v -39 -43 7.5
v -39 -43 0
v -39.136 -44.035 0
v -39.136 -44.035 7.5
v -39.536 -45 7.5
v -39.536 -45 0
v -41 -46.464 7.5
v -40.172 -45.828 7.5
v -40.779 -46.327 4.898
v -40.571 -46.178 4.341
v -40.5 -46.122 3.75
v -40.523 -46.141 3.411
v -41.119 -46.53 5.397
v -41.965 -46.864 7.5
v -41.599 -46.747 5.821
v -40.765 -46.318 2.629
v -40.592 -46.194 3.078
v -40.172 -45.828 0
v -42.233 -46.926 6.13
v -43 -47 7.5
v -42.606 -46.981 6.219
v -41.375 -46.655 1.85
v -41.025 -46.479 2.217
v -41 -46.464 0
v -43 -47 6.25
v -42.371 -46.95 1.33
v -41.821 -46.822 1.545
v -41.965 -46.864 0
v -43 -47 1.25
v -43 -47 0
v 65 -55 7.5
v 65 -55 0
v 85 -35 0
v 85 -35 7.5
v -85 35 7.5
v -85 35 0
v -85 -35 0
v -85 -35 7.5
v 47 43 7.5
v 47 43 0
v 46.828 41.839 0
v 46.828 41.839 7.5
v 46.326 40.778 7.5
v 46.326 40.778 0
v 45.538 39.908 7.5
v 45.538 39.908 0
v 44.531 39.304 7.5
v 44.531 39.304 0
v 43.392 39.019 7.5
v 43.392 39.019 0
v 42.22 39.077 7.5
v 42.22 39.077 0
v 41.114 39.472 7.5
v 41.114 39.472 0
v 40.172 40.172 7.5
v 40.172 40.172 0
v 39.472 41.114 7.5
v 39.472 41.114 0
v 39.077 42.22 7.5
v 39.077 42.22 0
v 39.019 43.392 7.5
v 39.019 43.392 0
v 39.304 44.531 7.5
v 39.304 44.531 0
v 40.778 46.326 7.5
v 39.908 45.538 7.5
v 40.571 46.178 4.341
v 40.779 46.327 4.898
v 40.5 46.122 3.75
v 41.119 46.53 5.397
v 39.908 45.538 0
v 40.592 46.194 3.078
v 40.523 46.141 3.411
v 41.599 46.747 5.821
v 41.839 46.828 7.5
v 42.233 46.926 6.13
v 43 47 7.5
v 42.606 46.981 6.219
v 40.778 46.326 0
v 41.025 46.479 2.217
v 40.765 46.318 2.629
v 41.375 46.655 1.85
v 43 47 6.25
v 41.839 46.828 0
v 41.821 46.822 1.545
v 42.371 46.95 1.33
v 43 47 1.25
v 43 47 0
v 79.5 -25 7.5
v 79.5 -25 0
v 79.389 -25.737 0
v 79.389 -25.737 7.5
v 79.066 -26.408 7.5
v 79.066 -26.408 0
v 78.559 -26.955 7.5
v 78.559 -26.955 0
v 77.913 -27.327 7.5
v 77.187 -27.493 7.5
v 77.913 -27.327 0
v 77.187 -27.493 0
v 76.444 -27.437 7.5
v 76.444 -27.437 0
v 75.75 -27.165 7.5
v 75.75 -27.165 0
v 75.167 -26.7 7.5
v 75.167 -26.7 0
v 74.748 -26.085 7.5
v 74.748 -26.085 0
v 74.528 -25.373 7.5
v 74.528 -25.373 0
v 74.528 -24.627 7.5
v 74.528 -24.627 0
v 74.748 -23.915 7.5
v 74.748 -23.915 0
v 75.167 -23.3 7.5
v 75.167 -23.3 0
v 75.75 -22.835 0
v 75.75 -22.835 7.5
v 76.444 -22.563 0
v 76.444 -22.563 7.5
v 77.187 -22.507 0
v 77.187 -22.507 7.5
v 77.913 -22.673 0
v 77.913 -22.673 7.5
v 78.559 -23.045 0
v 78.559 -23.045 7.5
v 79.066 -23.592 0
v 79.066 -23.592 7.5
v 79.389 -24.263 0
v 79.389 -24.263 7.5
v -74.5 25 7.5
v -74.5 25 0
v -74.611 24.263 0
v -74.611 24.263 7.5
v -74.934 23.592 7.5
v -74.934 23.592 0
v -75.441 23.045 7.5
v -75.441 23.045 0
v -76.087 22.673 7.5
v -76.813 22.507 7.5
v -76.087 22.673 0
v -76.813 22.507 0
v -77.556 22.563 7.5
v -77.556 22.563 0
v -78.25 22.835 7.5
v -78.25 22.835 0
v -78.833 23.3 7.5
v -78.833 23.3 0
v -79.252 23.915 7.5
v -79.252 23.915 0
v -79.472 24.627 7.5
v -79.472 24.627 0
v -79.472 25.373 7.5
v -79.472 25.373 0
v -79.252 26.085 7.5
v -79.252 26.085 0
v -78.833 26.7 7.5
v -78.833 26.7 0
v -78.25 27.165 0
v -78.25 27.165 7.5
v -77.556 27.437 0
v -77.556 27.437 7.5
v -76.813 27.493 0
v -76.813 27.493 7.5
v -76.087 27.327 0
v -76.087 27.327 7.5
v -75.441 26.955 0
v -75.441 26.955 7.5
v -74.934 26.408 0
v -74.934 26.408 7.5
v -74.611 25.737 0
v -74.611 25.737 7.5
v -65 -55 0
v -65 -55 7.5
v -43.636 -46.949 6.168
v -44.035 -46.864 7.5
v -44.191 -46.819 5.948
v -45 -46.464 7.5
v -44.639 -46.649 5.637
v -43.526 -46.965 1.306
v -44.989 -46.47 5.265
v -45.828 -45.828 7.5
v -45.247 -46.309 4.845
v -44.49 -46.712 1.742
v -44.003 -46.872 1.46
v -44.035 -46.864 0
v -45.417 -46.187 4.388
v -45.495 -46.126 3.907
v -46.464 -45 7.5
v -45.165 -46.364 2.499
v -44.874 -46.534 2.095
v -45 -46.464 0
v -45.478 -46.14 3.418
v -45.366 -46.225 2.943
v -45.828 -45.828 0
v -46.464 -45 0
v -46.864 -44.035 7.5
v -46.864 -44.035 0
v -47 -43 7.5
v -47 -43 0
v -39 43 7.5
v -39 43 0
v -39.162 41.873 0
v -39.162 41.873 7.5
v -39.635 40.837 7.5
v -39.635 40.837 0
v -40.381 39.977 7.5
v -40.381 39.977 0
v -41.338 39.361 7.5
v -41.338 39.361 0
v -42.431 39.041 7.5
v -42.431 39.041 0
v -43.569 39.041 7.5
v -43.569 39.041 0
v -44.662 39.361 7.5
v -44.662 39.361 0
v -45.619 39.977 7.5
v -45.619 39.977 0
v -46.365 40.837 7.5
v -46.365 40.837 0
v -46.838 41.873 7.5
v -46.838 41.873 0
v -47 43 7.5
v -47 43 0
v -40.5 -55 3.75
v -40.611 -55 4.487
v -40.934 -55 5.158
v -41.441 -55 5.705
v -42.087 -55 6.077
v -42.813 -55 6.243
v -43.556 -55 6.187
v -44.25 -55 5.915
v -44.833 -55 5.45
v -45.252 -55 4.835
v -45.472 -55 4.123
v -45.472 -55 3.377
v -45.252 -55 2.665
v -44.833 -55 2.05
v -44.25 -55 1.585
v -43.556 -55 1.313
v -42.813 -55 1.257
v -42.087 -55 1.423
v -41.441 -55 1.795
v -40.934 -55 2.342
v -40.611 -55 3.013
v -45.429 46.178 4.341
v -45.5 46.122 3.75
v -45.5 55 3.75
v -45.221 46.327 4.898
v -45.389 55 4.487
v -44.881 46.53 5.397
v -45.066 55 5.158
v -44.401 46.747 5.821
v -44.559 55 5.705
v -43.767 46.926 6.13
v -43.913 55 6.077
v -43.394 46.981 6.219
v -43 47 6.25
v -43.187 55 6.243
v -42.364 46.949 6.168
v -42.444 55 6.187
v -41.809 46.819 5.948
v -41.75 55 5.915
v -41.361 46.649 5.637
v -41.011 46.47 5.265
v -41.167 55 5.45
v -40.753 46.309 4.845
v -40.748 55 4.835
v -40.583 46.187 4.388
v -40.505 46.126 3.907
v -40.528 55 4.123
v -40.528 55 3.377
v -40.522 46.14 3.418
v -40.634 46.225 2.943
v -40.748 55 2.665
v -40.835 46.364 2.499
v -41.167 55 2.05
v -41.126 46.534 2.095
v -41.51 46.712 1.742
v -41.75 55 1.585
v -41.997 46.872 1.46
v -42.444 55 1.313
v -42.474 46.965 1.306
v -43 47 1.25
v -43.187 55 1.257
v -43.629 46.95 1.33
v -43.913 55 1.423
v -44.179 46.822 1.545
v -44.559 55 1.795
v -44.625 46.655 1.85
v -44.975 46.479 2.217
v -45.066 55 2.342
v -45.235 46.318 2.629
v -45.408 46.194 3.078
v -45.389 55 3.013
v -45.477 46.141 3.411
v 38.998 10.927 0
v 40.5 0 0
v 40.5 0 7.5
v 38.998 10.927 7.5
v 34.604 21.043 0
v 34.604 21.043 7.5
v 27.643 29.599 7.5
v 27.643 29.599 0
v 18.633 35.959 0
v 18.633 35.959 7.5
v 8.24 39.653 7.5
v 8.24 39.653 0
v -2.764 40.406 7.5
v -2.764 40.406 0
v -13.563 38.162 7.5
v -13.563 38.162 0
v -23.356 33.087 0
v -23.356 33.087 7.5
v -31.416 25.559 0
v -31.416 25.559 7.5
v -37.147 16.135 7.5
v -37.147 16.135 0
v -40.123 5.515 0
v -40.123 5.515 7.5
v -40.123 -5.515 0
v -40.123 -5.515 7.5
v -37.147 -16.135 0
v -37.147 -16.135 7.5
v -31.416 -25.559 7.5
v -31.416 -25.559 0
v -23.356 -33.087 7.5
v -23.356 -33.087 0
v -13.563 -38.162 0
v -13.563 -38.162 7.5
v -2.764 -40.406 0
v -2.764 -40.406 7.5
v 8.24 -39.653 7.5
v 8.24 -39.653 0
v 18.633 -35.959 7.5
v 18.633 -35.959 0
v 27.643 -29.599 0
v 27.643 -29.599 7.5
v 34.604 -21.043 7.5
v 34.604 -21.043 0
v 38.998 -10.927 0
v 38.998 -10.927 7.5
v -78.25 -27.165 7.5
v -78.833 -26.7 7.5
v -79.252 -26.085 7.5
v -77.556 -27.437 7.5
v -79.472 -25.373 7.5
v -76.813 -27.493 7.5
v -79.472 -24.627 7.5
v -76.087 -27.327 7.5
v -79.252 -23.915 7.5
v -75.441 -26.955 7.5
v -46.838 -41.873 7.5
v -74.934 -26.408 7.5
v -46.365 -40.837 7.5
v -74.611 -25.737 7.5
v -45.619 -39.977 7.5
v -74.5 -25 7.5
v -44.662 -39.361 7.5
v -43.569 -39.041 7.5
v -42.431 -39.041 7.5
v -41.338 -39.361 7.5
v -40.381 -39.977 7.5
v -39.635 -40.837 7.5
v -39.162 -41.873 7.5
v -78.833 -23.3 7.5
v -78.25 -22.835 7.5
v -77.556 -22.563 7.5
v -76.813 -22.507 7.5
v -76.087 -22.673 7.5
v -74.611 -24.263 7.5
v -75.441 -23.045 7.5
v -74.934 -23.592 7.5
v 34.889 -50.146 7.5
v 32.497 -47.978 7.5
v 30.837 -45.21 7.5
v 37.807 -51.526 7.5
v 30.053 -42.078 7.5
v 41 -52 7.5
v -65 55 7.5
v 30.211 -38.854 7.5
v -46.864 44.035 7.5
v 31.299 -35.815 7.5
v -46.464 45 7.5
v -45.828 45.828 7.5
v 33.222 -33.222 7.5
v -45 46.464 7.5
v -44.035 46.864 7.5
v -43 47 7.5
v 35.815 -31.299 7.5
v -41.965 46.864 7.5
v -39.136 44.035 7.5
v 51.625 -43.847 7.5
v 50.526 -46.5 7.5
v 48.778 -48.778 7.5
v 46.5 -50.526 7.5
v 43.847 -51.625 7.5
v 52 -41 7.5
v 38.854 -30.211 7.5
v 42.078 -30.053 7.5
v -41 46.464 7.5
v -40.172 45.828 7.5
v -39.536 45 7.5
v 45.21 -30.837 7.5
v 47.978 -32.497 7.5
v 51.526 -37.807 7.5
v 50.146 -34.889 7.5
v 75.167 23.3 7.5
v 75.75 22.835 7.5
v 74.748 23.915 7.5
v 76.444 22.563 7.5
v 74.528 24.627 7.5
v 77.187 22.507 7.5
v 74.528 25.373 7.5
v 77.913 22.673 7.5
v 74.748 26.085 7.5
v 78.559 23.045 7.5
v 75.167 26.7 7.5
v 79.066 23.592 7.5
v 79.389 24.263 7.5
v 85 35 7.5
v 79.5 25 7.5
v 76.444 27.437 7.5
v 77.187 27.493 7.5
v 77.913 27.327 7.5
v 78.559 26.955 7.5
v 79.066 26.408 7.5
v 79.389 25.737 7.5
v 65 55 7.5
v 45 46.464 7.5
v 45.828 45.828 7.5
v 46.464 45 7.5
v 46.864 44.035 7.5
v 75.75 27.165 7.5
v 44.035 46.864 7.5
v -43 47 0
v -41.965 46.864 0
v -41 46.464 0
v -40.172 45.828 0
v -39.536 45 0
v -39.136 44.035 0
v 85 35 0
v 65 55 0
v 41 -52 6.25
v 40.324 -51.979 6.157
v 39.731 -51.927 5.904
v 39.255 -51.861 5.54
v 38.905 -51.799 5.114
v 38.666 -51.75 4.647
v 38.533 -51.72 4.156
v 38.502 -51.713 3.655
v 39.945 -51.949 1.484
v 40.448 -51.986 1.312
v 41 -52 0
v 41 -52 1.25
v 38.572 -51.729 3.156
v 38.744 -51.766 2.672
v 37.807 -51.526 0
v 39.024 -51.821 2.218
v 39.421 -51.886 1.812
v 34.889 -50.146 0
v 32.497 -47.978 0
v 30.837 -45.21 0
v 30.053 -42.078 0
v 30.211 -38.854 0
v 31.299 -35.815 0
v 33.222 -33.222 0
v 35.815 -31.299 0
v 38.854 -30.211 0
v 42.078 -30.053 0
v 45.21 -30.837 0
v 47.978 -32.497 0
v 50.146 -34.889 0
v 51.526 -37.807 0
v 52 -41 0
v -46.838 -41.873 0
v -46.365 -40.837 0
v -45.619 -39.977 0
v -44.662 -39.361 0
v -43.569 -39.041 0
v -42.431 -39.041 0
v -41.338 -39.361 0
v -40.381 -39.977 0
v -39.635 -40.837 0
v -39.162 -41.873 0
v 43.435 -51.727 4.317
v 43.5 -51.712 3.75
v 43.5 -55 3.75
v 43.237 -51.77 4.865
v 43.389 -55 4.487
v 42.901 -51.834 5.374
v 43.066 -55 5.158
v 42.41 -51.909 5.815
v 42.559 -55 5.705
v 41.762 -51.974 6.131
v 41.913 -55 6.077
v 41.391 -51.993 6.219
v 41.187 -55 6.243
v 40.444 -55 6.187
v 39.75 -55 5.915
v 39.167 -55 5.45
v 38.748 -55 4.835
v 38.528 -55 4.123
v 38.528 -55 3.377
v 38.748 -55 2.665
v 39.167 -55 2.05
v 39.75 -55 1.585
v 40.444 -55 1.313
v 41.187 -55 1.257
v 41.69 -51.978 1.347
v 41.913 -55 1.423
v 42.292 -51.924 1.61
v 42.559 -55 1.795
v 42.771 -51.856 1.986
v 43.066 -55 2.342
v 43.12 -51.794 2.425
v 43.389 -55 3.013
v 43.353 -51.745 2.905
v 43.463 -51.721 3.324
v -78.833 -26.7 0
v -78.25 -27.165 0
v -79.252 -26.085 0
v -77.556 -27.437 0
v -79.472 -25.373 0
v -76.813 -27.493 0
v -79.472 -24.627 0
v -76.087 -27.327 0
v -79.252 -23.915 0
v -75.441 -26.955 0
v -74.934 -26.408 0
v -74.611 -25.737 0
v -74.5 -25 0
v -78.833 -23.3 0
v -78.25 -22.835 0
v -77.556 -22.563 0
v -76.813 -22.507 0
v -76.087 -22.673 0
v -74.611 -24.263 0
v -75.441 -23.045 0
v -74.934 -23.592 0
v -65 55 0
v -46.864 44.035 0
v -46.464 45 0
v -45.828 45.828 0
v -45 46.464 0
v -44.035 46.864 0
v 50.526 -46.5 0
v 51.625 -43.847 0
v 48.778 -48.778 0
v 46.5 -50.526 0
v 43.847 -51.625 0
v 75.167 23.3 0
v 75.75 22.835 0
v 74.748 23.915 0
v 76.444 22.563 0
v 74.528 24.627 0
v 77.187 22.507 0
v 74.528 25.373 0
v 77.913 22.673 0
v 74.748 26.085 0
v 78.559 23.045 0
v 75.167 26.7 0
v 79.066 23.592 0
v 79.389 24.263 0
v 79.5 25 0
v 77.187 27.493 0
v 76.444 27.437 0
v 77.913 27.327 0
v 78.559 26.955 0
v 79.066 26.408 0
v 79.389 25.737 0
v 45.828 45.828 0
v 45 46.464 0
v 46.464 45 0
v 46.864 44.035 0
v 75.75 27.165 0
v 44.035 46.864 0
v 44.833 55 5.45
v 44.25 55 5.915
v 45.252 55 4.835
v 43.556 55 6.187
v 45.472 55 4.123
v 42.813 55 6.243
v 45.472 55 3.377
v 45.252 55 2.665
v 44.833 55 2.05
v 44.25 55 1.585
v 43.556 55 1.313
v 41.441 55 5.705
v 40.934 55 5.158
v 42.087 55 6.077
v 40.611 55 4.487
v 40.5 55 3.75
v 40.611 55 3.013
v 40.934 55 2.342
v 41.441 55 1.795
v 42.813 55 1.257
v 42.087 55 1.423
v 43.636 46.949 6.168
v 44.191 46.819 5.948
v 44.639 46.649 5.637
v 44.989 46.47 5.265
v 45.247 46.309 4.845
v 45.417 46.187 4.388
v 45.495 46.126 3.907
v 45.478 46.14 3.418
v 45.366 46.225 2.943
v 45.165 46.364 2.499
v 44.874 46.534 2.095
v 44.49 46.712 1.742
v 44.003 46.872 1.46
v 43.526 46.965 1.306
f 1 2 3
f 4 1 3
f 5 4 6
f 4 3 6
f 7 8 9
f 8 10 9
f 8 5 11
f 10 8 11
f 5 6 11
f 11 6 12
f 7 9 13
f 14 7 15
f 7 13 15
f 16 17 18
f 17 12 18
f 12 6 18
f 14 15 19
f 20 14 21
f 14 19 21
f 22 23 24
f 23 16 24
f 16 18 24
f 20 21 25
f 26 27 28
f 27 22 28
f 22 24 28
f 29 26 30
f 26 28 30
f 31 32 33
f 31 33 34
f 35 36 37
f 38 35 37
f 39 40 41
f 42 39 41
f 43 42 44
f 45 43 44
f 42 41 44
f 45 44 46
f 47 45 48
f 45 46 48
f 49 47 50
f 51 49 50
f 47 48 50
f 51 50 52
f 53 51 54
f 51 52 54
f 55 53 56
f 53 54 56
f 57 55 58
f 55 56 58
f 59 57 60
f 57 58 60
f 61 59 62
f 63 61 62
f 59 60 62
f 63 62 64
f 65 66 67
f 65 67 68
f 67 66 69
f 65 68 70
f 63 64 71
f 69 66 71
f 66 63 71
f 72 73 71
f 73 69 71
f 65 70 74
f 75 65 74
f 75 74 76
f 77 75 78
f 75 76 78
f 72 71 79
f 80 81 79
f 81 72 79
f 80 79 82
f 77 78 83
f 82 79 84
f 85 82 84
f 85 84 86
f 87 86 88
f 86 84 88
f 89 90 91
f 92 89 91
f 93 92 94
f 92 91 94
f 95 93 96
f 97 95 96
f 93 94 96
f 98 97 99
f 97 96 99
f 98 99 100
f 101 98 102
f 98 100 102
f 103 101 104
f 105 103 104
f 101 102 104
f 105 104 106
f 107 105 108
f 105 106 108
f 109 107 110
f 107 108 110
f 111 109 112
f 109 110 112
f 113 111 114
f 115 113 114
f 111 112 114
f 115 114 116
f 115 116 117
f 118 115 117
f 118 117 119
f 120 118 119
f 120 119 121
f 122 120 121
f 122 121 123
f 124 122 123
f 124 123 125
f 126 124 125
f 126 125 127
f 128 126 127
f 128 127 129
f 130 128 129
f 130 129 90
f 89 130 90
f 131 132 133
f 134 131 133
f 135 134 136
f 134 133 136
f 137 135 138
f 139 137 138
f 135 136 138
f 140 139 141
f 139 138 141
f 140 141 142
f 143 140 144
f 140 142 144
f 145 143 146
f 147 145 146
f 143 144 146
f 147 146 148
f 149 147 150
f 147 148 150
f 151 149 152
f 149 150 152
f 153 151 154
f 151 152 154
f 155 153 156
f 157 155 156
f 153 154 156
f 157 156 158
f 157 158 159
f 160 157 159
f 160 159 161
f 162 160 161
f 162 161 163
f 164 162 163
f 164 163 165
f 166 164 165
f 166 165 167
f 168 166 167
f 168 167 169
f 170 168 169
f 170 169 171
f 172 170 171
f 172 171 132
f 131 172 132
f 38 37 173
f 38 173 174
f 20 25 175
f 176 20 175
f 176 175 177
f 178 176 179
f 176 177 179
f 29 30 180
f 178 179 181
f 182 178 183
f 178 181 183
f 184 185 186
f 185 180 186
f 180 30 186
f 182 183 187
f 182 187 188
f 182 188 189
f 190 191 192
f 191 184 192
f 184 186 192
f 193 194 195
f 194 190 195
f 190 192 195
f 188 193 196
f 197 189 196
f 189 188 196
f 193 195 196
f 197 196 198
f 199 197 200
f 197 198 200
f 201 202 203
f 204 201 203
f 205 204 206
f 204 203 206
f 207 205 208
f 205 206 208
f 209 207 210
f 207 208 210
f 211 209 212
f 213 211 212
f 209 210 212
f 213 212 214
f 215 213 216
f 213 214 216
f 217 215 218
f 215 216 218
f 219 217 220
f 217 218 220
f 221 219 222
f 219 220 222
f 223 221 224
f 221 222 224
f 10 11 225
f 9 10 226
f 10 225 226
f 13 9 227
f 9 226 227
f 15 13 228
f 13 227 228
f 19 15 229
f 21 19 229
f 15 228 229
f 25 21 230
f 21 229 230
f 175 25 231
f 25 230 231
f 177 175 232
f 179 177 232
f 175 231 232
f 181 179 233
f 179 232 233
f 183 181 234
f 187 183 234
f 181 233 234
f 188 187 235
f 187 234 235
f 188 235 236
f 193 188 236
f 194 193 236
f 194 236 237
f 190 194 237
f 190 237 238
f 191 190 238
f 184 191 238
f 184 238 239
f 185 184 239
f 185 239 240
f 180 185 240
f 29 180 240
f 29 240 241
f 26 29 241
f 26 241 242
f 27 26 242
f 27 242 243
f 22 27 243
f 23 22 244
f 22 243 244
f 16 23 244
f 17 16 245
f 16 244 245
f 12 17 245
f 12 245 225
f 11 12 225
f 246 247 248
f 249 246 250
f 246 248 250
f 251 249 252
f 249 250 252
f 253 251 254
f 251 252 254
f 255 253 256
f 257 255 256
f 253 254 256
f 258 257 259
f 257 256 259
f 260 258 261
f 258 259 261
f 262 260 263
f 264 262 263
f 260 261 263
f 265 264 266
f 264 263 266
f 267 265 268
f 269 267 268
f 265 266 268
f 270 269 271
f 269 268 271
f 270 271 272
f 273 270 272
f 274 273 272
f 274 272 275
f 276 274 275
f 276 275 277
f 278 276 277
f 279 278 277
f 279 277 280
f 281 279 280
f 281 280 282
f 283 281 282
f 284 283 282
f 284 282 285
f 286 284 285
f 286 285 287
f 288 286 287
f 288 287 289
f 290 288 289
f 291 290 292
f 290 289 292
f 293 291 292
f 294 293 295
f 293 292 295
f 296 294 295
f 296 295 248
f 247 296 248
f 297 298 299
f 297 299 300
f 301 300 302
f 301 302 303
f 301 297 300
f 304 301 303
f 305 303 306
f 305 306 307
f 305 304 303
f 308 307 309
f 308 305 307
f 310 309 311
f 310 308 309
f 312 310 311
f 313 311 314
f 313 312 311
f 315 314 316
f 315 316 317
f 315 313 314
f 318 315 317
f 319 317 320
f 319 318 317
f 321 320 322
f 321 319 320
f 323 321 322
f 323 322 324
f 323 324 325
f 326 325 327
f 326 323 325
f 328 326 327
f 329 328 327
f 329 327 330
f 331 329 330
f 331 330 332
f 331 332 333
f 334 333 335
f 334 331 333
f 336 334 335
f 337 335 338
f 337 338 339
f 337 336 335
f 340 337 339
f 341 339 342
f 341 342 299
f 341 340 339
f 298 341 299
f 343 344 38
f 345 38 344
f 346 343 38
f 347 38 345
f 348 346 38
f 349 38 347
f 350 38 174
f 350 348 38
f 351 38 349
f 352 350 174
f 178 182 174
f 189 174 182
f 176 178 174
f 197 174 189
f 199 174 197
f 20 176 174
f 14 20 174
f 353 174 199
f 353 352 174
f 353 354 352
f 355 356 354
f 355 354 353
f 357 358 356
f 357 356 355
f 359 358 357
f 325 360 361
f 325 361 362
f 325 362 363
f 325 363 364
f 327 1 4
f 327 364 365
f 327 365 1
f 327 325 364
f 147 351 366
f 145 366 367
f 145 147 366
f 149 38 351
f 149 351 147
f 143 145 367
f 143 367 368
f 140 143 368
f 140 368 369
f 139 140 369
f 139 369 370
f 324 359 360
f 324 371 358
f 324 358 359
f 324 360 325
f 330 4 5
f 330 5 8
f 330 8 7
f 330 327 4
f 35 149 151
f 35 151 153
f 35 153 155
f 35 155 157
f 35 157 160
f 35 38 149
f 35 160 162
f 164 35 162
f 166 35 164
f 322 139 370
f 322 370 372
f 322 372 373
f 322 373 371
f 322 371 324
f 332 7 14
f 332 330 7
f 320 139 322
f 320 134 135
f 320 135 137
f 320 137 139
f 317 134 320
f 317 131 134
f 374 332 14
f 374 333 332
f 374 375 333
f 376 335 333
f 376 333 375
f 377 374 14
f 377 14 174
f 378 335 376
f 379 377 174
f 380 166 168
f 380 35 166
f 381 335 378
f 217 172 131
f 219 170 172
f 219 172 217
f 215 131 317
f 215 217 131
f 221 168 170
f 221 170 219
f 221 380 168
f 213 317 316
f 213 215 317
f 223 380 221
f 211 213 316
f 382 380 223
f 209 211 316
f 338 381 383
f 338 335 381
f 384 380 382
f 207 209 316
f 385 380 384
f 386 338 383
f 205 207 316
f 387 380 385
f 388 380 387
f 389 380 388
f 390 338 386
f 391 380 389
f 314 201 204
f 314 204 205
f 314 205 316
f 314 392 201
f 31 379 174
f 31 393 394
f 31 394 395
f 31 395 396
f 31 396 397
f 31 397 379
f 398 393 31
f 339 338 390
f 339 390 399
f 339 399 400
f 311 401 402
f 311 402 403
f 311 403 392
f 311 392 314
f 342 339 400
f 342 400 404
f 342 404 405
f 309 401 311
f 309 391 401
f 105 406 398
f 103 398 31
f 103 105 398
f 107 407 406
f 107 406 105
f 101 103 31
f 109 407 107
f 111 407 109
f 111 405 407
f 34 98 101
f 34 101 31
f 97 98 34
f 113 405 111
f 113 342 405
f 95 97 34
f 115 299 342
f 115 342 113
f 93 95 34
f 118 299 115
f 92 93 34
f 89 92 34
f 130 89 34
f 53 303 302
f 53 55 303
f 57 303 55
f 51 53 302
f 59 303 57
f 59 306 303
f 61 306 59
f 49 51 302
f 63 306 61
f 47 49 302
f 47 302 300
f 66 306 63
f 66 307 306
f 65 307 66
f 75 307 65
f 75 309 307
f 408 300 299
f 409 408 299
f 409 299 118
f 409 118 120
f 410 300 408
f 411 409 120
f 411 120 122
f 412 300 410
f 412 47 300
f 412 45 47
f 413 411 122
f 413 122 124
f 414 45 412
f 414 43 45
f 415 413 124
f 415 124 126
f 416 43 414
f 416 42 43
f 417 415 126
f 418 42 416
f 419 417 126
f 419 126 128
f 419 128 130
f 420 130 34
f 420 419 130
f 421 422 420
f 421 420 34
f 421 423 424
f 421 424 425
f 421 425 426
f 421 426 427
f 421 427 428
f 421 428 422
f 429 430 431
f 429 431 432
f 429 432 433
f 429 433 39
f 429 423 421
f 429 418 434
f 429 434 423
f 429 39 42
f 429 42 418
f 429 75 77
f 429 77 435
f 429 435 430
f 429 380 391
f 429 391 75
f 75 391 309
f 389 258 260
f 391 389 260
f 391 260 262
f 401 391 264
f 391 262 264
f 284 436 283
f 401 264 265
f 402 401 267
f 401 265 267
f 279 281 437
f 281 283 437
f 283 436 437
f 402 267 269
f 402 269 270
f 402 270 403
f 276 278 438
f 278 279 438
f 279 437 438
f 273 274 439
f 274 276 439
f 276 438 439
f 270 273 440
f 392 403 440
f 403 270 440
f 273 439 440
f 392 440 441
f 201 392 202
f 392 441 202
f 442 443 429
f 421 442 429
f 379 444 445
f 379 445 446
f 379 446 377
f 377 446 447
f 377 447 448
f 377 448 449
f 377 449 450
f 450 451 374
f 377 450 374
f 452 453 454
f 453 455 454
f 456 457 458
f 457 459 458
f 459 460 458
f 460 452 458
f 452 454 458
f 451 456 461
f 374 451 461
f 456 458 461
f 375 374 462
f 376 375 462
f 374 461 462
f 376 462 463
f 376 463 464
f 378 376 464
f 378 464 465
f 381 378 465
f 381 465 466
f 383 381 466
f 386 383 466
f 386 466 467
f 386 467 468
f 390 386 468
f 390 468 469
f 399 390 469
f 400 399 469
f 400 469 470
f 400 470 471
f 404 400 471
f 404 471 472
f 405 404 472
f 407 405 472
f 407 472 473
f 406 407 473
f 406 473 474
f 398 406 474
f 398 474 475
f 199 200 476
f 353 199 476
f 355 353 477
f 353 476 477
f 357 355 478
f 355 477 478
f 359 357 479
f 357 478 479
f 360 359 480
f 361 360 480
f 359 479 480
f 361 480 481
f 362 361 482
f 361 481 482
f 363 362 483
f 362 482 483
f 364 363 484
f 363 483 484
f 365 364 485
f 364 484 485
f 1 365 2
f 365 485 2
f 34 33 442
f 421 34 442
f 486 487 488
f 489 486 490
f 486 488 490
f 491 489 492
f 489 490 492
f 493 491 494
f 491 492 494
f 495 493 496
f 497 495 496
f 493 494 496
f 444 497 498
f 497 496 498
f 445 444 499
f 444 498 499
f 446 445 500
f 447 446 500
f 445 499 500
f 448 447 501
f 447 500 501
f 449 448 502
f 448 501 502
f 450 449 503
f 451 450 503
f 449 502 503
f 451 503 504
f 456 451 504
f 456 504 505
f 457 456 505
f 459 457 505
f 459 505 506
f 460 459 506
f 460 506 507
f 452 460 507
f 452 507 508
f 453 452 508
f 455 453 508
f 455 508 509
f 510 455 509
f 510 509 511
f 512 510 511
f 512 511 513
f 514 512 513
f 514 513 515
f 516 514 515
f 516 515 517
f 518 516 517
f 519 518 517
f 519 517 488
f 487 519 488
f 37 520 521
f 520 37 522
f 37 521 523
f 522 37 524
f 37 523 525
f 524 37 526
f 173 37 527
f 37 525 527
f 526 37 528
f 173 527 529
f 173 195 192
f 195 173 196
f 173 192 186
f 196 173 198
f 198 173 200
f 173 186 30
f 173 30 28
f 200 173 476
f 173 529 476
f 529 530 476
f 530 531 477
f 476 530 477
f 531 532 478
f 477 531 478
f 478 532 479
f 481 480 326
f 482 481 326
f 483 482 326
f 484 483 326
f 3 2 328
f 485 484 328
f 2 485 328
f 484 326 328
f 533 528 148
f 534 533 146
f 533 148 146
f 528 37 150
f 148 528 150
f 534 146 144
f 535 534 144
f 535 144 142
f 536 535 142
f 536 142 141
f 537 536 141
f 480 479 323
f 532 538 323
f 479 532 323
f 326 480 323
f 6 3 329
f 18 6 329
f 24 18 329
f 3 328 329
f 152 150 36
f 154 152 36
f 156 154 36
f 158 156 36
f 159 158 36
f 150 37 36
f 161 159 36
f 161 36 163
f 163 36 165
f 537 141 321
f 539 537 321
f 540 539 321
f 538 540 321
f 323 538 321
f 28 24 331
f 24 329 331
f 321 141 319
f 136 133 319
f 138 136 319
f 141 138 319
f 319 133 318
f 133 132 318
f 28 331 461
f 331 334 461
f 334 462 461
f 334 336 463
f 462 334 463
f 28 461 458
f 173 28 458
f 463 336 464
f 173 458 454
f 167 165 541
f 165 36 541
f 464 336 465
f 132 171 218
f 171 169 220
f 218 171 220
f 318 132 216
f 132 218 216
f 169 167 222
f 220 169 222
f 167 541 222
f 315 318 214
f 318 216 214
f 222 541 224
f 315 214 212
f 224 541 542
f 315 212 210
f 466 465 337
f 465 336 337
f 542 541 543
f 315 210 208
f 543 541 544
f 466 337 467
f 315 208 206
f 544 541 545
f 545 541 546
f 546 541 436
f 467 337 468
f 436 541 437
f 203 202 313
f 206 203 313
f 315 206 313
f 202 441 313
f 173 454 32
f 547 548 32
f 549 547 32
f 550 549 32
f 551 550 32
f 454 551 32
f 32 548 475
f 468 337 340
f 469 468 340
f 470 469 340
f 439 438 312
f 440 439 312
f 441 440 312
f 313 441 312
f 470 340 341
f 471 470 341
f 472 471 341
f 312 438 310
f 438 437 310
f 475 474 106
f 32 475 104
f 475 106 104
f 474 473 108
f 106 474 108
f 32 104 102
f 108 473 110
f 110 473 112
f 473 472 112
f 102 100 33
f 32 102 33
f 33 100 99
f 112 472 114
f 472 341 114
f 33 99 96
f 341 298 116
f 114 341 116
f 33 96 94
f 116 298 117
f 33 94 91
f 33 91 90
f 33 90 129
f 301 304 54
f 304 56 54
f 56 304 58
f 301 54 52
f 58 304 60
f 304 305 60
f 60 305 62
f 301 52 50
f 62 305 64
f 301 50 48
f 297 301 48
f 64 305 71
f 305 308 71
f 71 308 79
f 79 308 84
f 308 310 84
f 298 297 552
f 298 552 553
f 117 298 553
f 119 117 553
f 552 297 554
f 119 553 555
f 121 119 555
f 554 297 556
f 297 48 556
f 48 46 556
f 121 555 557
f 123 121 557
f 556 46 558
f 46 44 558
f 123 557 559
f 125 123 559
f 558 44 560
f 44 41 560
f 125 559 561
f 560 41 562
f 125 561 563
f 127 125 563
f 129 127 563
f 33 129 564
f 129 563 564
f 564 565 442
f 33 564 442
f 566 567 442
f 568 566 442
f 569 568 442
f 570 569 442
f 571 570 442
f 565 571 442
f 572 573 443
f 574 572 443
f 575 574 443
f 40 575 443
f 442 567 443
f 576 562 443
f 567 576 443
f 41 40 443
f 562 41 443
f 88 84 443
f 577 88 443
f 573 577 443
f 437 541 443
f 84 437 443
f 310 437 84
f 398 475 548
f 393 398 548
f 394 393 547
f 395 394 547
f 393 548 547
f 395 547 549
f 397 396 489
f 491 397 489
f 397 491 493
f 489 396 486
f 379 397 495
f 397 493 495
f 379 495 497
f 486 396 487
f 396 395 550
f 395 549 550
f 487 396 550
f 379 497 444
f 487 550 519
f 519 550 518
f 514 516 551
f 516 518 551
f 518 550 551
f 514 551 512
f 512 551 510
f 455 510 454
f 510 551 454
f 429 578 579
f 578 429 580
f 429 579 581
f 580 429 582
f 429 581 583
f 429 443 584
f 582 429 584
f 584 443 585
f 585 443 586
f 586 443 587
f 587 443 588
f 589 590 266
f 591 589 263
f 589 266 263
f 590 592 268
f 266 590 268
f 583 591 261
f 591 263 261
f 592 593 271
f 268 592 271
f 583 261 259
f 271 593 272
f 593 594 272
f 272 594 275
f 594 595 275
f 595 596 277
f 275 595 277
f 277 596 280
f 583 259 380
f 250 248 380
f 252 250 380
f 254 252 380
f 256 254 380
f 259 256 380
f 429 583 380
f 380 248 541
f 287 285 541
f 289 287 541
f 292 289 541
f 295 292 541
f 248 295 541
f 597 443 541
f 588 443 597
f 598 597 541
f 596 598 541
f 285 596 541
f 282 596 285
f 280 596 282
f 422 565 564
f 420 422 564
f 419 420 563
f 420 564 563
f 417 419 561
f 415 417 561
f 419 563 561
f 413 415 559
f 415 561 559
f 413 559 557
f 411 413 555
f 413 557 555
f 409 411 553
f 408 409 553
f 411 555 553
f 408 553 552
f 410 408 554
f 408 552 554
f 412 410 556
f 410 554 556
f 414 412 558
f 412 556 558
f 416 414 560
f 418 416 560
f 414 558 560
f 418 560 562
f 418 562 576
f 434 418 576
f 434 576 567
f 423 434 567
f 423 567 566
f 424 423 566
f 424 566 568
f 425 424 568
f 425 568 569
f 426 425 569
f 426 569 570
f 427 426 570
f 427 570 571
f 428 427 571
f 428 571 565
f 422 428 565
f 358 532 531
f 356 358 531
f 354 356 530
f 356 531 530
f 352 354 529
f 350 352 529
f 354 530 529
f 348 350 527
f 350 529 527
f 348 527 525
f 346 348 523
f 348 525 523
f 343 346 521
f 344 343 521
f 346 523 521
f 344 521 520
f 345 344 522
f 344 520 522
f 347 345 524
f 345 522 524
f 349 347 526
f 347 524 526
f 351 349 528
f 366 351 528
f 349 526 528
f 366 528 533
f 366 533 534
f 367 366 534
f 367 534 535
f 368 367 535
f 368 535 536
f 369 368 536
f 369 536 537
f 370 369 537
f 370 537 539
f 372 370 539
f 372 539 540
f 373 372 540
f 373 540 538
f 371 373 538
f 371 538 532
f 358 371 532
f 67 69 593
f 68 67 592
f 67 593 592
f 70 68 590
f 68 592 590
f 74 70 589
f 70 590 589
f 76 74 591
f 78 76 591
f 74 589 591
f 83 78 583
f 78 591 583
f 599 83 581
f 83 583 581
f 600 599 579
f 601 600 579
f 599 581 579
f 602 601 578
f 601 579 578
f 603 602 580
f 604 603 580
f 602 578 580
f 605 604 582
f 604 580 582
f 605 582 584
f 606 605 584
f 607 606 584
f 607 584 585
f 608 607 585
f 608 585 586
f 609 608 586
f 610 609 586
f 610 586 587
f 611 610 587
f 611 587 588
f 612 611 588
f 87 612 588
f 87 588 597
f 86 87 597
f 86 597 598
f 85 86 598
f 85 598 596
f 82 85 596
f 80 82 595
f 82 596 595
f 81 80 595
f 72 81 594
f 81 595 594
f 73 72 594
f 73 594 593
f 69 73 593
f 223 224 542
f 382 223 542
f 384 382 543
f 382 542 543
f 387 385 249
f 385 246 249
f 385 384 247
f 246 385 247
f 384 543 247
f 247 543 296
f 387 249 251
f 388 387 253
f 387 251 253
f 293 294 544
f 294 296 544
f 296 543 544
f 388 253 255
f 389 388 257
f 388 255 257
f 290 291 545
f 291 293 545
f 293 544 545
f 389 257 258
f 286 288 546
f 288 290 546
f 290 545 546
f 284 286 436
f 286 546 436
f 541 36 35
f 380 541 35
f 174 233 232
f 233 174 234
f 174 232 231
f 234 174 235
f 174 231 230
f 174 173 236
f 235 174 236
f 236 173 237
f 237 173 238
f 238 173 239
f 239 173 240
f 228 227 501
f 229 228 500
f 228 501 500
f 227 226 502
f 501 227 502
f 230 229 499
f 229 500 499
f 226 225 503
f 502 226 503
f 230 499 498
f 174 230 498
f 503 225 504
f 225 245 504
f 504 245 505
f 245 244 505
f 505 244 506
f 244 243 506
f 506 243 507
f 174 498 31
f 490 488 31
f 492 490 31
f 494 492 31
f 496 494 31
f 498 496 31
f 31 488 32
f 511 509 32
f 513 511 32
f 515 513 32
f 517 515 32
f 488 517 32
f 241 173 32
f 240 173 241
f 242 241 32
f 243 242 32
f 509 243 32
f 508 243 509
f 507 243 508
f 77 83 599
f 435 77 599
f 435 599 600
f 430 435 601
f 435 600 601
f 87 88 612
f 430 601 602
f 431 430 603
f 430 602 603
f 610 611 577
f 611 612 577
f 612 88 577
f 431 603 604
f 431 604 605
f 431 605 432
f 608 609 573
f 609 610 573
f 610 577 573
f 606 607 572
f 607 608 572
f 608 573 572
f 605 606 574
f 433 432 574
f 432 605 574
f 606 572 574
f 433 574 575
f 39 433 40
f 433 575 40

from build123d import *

# Parameters (mm, degrees)
F0_R     = 40.5
F1_DEPTH = 7.5
F3_SIZE  = 20
F2_R     = 2.5
F4_DEPTH = 25
F5_R     = 2.5
F6_DEPTH = 10
F7_R     = 2.5
F8_DEPTH = 10


# Not quite as in the source:
# - a feature names something its author has since deleted; it is built from what else it names


with BuildPart() as f1:
    # F0 (on Top) → F1 (new body)
    with BuildSketch(Plane.XY):
        with BuildLine():
            Line((43, 47), (43, 55))
            Line((43, 55), (-43, 55))
            Line((-43, 55), (-43, 47))
            ThreePointArc((-43, 47), (-40.1715728753, 45.8284271247), (-39, 43))
            ThreePointArc((-39, 43), (-43, 39), (-47, 43))
            Line((-47, 43), (-85, 43))
            Line((-85, 43), (-85, -43))
            Line((-85, -43), (-47, -43))
            ThreePointArc((-47, -43), (-43, -39), (-39, -43))
            ThreePointArc((-39, -43), (-40.1715728753, -45.8284271247), (-43, -47))
            Line((-43, -47), (-43, -55))
            Line((-43, -55), (41, -55))
            Line((41, -55), (85, -55))
            Line((85, -55), (85, 43))
            Line((85, 43), (47, 43))
            ThreePointArc((47, 43), (40.1715728753, 40.1715728753), (43, 47))
        make_face()
        with BuildLine():
            ThreePointArc((52, -41), (48.7781745931, -48.7781745931), (41, -52))
            ThreePointArc((41, -52), (33.2218254069, -33.2218254069), (52, -41))
        make_face(mode=Mode.SUBTRACT)
        Circle(F0_R, mode=Mode.SUBTRACT)
        with BuildLine():
            Line((85, 43), (85, 55))
            Line((85, 55), (43, 55))
            Line((43, 55), (43, 47))
            ThreePointArc((43, 47), (45.8284271247, 45.8284271247), (47, 43))
            Line((47, 43), (85, 43))
        make_face()
        with BuildLine():
            Line((-85, -55), (-43, -55))
            Line((-43, -55), (-43, -47))
            ThreePointArc((-43, -47), (-45.8284271247, -45.8284271247), (-47, -43))
            Line((-47, -43), (-85, -43))
            Line((-85, -43), (-85, -55))
        make_face()
        with BuildLine():
            Line((-43, 47), (-43, 55))
            Line((-43, 55), (-85, 55))
            Line((-85, 55), (-85, 43))
            Line((-85, 43), (-47, 43))
            ThreePointArc((-47, 43), (-45.8284271247, 45.8284271247), (-43, 47))
        make_face()
    extrude(amount=F1_DEPTH)

    # F3
    f3_edges = [f1.edges().sort_by_distance(p)[0] for p in [
        (85, -55, 3.75),
        (-85, -55, 3.75),
        (-85, 55, 3.75),
        (85, 55, 3.75),
    ]]
    chamfer(f3_edges, length=F3_SIZE)

    # F2 (on face) → F4 (cut)
    with BuildSketch(Plane(origin=(0, 0, 0), x_dir=(1, 0, 0), z_dir=(0, 0, -1))):
        with Locations((77, -25)):
            Circle(F2_R)
        with Locations((77, 25)):
            Circle(F2_R)
        with Locations((-77, 25)):
            Circle(F2_R)
        with Locations((-77, -25)):
            Circle(F2_R)
    extrude(amount=-F4_DEPTH, mode=Mode.SUBTRACT)

    # F5 (on face) → F6 (cut)
    with BuildSketch(Plane.XZ.offset(55)):
        with Locations((-43, 3.75)):
            Circle(F5_R)
        with Locations((41, 3.75)):
            Circle(F5_R)
    extrude(amount=-F6_DEPTH, mode=Mode.SUBTRACT)

    # F7 (on face) → F8 (cut)
    with BuildSketch(Plane(origin=(0, 55, 0), x_dir=(-1, 0, 0), z_dir=(0, 1, 0))):
        with Locations((-43, 3.75)):
            Circle(F7_R)
        with Locations((43, 3.75)):
            Circle(F7_R)
    extrude(amount=-F8_DEPTH, mode=Mode.SUBTRACT)


solid = f1.part
